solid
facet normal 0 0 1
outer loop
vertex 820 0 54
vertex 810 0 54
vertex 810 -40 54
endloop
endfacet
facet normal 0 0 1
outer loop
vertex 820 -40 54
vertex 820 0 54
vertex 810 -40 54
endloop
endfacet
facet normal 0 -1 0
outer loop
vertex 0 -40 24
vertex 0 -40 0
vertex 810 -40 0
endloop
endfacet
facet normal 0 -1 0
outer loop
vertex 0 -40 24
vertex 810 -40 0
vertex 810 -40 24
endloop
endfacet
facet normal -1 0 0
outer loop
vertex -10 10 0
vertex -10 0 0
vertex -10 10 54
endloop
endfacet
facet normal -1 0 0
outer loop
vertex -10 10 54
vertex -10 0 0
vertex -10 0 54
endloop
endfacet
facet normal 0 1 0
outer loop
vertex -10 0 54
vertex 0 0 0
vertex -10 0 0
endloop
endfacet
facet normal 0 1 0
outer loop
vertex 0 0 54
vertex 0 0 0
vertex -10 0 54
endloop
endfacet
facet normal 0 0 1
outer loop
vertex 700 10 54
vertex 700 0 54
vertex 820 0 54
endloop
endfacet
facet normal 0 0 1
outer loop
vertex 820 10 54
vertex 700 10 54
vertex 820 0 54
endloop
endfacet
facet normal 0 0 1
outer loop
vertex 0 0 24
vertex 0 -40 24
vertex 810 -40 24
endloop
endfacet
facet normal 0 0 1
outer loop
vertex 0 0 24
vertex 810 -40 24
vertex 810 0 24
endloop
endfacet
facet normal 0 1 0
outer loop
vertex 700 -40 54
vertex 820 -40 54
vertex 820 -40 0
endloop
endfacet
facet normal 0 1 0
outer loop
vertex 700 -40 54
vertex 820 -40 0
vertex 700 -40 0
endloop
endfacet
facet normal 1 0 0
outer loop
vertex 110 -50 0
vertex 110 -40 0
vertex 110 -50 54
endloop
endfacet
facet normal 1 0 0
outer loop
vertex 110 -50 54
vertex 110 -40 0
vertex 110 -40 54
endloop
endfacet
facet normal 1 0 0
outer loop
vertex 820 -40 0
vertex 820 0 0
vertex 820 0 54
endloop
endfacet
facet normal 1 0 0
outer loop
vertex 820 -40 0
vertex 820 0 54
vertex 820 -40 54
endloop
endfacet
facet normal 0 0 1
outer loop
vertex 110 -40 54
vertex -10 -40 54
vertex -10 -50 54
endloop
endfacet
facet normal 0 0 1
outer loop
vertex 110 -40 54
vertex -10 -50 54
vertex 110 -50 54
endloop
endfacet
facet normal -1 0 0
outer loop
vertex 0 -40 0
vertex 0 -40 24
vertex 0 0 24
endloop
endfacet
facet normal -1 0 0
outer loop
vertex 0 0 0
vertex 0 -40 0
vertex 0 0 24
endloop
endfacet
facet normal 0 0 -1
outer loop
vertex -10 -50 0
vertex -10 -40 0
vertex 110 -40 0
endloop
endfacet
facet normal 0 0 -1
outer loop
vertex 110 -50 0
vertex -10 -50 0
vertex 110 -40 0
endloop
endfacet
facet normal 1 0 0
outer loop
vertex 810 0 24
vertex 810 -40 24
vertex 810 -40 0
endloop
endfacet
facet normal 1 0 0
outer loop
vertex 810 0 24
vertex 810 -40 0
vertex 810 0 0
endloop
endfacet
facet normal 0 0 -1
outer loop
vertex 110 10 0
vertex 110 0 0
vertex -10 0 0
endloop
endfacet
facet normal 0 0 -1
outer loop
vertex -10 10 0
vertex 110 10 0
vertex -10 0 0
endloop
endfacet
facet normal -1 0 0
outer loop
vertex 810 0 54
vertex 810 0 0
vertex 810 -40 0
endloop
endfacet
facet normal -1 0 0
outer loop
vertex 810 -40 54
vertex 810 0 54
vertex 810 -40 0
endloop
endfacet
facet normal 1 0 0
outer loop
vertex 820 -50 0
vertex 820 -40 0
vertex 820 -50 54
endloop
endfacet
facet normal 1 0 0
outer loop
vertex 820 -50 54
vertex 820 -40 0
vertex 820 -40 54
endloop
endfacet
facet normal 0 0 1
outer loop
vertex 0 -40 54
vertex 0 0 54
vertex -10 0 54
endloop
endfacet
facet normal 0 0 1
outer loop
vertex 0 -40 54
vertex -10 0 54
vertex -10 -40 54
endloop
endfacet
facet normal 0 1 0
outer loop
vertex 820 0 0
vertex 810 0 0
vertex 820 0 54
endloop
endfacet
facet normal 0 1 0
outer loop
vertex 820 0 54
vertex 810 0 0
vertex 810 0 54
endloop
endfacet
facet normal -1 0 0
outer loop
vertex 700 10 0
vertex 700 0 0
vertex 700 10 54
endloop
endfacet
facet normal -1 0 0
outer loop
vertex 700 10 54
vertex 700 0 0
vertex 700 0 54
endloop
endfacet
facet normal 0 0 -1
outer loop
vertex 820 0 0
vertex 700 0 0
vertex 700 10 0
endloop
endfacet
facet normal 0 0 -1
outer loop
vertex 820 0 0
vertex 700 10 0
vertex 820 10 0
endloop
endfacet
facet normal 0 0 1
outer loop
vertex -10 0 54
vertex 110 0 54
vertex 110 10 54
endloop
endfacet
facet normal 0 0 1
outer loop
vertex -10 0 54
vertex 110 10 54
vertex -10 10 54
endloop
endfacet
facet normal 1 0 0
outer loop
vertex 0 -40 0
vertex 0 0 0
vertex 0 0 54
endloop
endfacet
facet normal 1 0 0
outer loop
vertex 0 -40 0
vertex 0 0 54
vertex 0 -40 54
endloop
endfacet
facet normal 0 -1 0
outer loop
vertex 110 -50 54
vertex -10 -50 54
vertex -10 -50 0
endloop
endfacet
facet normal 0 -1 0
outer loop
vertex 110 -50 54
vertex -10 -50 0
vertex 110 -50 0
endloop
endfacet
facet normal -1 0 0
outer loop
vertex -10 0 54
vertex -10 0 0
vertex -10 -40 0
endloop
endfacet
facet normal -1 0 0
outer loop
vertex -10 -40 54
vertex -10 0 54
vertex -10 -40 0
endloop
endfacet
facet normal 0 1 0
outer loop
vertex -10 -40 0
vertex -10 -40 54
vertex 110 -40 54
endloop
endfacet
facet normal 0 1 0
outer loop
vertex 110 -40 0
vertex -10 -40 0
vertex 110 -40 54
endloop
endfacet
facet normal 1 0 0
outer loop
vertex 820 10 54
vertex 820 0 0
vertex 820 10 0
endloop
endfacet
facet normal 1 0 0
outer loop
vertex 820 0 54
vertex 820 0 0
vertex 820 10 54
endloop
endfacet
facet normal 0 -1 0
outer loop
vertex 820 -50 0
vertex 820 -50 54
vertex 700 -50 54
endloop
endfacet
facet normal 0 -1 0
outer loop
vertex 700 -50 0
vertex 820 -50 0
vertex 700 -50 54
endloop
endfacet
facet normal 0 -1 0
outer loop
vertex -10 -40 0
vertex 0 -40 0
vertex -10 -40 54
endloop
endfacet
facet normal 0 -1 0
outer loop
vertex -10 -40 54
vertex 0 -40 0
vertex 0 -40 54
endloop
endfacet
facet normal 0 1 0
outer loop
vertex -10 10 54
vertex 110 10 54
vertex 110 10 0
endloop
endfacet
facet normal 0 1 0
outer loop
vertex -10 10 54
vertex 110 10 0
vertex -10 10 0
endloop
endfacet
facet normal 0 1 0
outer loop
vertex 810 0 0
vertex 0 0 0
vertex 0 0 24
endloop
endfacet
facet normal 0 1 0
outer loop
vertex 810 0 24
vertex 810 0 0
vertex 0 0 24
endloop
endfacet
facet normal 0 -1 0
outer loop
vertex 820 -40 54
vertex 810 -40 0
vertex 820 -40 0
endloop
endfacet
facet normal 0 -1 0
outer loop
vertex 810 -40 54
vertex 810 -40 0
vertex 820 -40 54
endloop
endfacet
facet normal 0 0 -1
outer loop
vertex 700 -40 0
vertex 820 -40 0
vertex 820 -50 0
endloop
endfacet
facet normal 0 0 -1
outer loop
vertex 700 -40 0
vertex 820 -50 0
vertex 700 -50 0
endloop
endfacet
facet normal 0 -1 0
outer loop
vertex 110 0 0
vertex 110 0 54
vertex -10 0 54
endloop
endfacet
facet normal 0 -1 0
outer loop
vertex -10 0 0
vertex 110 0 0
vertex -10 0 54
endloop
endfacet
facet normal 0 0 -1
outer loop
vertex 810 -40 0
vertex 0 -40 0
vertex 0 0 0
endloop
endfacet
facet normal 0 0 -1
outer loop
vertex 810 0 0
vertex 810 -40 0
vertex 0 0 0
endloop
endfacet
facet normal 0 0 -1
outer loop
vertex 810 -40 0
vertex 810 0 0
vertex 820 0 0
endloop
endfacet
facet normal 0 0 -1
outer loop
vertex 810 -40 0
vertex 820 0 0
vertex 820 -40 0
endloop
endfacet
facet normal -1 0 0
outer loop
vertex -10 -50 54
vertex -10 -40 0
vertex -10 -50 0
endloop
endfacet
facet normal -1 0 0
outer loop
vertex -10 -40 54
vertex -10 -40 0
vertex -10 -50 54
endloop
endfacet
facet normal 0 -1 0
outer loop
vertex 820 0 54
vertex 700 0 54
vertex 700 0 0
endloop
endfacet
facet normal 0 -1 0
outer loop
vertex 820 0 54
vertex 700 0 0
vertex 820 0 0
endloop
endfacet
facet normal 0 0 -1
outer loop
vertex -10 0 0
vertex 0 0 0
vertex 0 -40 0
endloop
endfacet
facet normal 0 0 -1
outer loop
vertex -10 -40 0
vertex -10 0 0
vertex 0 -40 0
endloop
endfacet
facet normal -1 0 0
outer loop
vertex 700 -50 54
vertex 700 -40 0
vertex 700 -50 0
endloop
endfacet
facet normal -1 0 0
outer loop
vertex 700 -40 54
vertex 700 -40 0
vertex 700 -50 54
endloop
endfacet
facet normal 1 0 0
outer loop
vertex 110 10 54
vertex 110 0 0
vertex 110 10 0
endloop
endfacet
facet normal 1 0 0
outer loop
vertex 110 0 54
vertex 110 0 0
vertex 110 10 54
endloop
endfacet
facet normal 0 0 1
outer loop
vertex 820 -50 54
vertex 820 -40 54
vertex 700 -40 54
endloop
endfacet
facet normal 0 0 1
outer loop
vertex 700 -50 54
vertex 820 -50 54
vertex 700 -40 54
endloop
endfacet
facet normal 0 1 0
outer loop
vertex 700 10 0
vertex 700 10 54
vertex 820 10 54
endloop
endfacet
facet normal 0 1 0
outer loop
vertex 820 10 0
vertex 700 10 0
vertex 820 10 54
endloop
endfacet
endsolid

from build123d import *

# Parameters (mm, degrees)
F0_W     = 40
F0_H     = 24
F1_DEPTH = 810
F2_W     = 40
F2_H     = 54
F3_DEPTH = 10
F4_W     = 120
F4_H     = 54
F5_DEPTH = 10
F6_W     = 120
F6_H     = 54
F7_DEPTH = 10


with BuildPart() as f1:
    # F0 (on Right) → F1 (new body)
    with BuildSketch(Plane.YZ):
        with Locations((-20, 12)):
            Rectangle(F0_W, F0_H)
    extrude(amount=F1_DEPTH)


with BuildPart() as f3:
    # F2 (on face) → F3 (new body)
    with BuildSketch(Plane(origin=(0, 0, 0), x_dir=(0, -1, 0), z_dir=(-1, 0, 0))):
        with Locations((20, 27)):
            Rectangle(F2_W, F2_H)
    extrude(amount=F3_DEPTH)


with BuildPart() as f5:
    # F4 (on face) → F5 (new body)
    with BuildSketch(Plane.XZ.offset(40)):
        with Locations((50, 27)):
            Rectangle(F4_W, F4_H)
    extrude(amount=F5_DEPTH)


with BuildPart() as f7:
    # F6 (on face) → F7 (new body)
    with BuildSketch(Plane(origin=(0, 0, 0), x_dir=(-1, 0, 0), z_dir=(0, 1, 0))):
        with Locations((-50, 27)):
            Rectangle(F6_W, F6_H)
    extrude(amount=F7_DEPTH)


with BuildPart() as f10_1:
    # F10: instance of F5
    add(f5.part.mirror(Plane.YZ.offset(405)))


with BuildPart() as f10_2:
    # F10: instance of F3
    add(f3.part.mirror(Plane.YZ.offset(405)))


with BuildPart() as f10_3:
    # F10: instance of F7
    add(f7.part.mirror(Plane.YZ.offset(405)))


solid = Compound([f1.part, f3.part, f5.part, f7.part, f10_1.part, f10_2.part, f10_3.part])
